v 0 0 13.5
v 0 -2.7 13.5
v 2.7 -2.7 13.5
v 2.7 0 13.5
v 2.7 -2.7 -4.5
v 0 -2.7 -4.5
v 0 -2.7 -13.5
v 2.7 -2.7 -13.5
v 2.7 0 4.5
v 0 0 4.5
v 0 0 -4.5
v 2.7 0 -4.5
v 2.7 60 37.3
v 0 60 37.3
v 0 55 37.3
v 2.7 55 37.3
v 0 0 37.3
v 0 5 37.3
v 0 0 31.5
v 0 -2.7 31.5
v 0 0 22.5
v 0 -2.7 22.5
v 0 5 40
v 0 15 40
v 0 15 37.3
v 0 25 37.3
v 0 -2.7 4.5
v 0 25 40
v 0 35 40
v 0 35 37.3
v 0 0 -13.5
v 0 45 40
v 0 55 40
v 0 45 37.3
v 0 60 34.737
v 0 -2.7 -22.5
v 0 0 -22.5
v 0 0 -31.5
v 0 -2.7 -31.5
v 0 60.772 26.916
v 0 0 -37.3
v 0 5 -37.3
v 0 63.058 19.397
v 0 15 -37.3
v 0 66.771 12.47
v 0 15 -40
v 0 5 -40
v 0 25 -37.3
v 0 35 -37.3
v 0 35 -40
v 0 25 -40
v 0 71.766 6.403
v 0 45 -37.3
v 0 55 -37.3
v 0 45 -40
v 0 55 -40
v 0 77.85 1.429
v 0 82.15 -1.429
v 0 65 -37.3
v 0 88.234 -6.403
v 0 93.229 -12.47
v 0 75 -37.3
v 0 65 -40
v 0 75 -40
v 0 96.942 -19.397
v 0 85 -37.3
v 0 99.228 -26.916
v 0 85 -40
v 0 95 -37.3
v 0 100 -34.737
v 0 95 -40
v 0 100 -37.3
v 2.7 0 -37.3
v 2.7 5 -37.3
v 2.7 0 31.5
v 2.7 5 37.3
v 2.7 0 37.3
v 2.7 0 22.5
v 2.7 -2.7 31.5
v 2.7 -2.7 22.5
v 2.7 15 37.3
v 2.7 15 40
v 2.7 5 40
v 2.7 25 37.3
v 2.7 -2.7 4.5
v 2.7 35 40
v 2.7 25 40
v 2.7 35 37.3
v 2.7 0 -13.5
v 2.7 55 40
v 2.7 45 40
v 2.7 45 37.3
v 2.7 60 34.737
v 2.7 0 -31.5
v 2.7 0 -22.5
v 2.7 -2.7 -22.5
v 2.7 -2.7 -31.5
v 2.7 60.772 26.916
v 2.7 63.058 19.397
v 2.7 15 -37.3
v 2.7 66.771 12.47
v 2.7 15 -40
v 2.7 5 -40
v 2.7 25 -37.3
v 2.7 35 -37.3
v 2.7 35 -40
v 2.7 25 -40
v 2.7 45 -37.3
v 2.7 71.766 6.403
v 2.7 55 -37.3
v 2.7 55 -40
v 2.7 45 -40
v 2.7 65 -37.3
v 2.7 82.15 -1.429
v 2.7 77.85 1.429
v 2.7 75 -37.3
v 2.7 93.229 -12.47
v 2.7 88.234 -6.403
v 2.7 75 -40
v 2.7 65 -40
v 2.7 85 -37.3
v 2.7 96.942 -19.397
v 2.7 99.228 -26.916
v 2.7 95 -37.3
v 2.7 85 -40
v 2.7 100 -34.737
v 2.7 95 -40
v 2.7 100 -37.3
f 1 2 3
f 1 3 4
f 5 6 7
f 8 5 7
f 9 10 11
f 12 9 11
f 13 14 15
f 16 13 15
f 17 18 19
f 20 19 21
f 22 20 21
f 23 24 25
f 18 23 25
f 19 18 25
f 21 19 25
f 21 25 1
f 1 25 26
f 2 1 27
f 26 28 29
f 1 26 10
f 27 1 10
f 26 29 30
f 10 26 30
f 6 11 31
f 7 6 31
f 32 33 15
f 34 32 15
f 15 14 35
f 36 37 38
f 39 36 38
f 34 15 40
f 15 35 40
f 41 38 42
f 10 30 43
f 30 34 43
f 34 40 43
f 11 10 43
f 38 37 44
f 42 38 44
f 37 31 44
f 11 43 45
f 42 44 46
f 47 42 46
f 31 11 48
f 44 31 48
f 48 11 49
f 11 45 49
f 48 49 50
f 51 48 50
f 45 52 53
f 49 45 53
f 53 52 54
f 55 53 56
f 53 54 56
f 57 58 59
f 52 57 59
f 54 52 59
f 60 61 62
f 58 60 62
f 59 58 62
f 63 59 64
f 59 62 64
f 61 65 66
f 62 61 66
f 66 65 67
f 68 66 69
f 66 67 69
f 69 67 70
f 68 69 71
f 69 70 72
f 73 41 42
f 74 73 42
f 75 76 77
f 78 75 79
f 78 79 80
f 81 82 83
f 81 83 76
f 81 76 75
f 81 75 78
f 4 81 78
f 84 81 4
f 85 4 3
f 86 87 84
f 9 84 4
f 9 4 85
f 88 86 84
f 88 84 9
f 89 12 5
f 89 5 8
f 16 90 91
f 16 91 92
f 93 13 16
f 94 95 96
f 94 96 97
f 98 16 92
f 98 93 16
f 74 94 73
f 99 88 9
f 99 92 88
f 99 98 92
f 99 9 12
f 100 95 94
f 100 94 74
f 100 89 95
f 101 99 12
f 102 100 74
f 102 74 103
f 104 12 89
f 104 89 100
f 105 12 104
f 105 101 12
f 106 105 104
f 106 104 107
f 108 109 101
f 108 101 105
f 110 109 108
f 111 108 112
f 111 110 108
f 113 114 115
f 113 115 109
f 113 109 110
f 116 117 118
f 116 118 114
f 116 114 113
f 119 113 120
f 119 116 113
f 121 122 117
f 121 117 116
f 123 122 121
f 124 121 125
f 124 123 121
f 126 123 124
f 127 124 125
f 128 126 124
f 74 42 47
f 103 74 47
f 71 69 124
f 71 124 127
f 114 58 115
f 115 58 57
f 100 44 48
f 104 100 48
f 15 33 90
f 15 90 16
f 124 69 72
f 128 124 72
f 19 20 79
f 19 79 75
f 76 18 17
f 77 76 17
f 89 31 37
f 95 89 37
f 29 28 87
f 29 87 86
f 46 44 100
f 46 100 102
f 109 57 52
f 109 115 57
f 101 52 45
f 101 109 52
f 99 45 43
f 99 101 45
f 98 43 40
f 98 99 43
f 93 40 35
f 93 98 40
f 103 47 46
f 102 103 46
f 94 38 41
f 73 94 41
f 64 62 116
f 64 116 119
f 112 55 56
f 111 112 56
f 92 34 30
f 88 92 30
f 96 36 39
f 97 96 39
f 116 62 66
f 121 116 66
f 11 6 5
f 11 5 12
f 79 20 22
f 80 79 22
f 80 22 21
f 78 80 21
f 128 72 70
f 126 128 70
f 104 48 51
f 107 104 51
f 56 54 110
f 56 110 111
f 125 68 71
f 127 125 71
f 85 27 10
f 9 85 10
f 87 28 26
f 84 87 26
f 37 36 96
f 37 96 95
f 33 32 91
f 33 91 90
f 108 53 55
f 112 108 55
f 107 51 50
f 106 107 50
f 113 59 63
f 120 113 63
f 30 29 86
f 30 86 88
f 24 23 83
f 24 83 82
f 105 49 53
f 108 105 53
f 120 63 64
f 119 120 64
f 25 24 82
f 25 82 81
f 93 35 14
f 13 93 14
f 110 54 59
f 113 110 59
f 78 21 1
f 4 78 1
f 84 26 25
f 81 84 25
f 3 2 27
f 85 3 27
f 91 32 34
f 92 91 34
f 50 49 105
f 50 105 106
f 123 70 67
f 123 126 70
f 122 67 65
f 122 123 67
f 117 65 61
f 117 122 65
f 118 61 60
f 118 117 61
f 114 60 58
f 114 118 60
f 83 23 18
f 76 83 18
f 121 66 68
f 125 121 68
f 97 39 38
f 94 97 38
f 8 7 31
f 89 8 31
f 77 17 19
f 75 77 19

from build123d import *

# Parameters (mm, degrees)
BOSS_EXTRU_1_DEPTH              = 2.7
ESQUISSE2_W                     = 9
ESQUISSE2_H                     = 2.7
BOSS_EXTRU_2_DEPTH              = 2.7
R_P_TITION_LIN_AIRE1_COUNT      = 3
R_P_TITION_LIN_AIRE1_PITCH      = 18
R_P_TITION_LIN_AIRE1_COL_COUNT  = 2
R_P_TITION_LIN_AIRE1_COL_PITCH  = 18
ESQUISSE3_W                     = 2.7
ESQUISSE3_H                     = 10
BOSS_EXTRU_3_DEPTH              = 2.7
R_P_TITION_LIN_AIRE2_COUNT      = 5
R_P_TITION_LIN_AIRE2_PITCH      = 20
R_P_TITION_LIN_AIRE2_COUNT_DIR2 = 2
R_P_TITION_LIN_AIRE2_PITCH_DIR2 = 77.3
CONG_1_R                        = 40


with BuildPart() as part:
    # Esquisse1 → Boss.-Extru.1 (new body)
    with BuildSketch(Plane(origin=(0, 0, 0), x_dir=(0, 0, -1), z_dir=(1, 0, 0))):
        Polygon((37.3, 100), (13.3, 100), (-13.3, 60), (-37.3, 60), (-37.3, 0), (37.3, 0), align=None)
    extrude(amount=BOSS_EXTRU_1_DEPTH)

    # Esquisse2 → Boss.-Extru.2 (add)
    with BuildSketch(Plane(origin=(0, 0, 0), x_dir=(0, 0, -1), z_dir=(1, 0, 0))):
        with Locations((-9, -1.35)):
            Rectangle(ESQUISSE2_W, ESQUISSE2_H)
    boss_extru_2 = extrude(amount=BOSS_EXTRU_2_DEPTH)

    # Répétition linéaire1: Boss.-Extru.2 ×3
    with Locations(*[(0, 0, -i * R_P_TITION_LIN_AIRE1_PITCH) for i in range(1, R_P_TITION_LIN_AIRE1_COUNT)]):
        add(boss_extru_2)

    # Répétition linéaire1 col: Boss.-Extru.2 ×2
    with Locations(*[(0, 0, i * R_P_TITION_LIN_AIRE1_COL_PITCH) for i in range(1, R_P_TITION_LIN_AIRE1_COL_COUNT)]):
        add(boss_extru_2)

    # Esquisse3 → Boss.-Extru.3 (add)
    with BuildSketch(Plane(origin=(0, 0, 0), x_dir=(0, 0, -1), z_dir=(1, 0, 0))):
        with Locations((-38.65, 10)):
            Rectangle(ESQUISSE3_W, ESQUISSE3_H)
    boss_extru_3 = extrude(amount=BOSS_EXTRU_3_DEPTH)

    # Répétition linéaire2: Boss.-Extru.3 5 × 2, 2 skipped
    with Locations(*[(0, i * R_P_TITION_LIN_AIRE2_PITCH, -j * R_P_TITION_LIN_AIRE2_PITCH_DIR2) for i in range(R_P_TITION_LIN_AIRE2_COUNT) for j in range(R_P_TITION_LIN_AIRE2_COUNT_DIR2) if (i, j) not in ((0, 0), (3, 0), (4, 0))]):
        add(boss_extru_3)

    # Congé1
    cong_1_edges = [part.edges().sort_by_distance(p)[0] for p in [
        (1.35, 60, 13.3),
        (1.35, 100, -13.3),
    ]]
    fillet(cong_1_edges, radius=CONG_1_R)


solid = part.part
